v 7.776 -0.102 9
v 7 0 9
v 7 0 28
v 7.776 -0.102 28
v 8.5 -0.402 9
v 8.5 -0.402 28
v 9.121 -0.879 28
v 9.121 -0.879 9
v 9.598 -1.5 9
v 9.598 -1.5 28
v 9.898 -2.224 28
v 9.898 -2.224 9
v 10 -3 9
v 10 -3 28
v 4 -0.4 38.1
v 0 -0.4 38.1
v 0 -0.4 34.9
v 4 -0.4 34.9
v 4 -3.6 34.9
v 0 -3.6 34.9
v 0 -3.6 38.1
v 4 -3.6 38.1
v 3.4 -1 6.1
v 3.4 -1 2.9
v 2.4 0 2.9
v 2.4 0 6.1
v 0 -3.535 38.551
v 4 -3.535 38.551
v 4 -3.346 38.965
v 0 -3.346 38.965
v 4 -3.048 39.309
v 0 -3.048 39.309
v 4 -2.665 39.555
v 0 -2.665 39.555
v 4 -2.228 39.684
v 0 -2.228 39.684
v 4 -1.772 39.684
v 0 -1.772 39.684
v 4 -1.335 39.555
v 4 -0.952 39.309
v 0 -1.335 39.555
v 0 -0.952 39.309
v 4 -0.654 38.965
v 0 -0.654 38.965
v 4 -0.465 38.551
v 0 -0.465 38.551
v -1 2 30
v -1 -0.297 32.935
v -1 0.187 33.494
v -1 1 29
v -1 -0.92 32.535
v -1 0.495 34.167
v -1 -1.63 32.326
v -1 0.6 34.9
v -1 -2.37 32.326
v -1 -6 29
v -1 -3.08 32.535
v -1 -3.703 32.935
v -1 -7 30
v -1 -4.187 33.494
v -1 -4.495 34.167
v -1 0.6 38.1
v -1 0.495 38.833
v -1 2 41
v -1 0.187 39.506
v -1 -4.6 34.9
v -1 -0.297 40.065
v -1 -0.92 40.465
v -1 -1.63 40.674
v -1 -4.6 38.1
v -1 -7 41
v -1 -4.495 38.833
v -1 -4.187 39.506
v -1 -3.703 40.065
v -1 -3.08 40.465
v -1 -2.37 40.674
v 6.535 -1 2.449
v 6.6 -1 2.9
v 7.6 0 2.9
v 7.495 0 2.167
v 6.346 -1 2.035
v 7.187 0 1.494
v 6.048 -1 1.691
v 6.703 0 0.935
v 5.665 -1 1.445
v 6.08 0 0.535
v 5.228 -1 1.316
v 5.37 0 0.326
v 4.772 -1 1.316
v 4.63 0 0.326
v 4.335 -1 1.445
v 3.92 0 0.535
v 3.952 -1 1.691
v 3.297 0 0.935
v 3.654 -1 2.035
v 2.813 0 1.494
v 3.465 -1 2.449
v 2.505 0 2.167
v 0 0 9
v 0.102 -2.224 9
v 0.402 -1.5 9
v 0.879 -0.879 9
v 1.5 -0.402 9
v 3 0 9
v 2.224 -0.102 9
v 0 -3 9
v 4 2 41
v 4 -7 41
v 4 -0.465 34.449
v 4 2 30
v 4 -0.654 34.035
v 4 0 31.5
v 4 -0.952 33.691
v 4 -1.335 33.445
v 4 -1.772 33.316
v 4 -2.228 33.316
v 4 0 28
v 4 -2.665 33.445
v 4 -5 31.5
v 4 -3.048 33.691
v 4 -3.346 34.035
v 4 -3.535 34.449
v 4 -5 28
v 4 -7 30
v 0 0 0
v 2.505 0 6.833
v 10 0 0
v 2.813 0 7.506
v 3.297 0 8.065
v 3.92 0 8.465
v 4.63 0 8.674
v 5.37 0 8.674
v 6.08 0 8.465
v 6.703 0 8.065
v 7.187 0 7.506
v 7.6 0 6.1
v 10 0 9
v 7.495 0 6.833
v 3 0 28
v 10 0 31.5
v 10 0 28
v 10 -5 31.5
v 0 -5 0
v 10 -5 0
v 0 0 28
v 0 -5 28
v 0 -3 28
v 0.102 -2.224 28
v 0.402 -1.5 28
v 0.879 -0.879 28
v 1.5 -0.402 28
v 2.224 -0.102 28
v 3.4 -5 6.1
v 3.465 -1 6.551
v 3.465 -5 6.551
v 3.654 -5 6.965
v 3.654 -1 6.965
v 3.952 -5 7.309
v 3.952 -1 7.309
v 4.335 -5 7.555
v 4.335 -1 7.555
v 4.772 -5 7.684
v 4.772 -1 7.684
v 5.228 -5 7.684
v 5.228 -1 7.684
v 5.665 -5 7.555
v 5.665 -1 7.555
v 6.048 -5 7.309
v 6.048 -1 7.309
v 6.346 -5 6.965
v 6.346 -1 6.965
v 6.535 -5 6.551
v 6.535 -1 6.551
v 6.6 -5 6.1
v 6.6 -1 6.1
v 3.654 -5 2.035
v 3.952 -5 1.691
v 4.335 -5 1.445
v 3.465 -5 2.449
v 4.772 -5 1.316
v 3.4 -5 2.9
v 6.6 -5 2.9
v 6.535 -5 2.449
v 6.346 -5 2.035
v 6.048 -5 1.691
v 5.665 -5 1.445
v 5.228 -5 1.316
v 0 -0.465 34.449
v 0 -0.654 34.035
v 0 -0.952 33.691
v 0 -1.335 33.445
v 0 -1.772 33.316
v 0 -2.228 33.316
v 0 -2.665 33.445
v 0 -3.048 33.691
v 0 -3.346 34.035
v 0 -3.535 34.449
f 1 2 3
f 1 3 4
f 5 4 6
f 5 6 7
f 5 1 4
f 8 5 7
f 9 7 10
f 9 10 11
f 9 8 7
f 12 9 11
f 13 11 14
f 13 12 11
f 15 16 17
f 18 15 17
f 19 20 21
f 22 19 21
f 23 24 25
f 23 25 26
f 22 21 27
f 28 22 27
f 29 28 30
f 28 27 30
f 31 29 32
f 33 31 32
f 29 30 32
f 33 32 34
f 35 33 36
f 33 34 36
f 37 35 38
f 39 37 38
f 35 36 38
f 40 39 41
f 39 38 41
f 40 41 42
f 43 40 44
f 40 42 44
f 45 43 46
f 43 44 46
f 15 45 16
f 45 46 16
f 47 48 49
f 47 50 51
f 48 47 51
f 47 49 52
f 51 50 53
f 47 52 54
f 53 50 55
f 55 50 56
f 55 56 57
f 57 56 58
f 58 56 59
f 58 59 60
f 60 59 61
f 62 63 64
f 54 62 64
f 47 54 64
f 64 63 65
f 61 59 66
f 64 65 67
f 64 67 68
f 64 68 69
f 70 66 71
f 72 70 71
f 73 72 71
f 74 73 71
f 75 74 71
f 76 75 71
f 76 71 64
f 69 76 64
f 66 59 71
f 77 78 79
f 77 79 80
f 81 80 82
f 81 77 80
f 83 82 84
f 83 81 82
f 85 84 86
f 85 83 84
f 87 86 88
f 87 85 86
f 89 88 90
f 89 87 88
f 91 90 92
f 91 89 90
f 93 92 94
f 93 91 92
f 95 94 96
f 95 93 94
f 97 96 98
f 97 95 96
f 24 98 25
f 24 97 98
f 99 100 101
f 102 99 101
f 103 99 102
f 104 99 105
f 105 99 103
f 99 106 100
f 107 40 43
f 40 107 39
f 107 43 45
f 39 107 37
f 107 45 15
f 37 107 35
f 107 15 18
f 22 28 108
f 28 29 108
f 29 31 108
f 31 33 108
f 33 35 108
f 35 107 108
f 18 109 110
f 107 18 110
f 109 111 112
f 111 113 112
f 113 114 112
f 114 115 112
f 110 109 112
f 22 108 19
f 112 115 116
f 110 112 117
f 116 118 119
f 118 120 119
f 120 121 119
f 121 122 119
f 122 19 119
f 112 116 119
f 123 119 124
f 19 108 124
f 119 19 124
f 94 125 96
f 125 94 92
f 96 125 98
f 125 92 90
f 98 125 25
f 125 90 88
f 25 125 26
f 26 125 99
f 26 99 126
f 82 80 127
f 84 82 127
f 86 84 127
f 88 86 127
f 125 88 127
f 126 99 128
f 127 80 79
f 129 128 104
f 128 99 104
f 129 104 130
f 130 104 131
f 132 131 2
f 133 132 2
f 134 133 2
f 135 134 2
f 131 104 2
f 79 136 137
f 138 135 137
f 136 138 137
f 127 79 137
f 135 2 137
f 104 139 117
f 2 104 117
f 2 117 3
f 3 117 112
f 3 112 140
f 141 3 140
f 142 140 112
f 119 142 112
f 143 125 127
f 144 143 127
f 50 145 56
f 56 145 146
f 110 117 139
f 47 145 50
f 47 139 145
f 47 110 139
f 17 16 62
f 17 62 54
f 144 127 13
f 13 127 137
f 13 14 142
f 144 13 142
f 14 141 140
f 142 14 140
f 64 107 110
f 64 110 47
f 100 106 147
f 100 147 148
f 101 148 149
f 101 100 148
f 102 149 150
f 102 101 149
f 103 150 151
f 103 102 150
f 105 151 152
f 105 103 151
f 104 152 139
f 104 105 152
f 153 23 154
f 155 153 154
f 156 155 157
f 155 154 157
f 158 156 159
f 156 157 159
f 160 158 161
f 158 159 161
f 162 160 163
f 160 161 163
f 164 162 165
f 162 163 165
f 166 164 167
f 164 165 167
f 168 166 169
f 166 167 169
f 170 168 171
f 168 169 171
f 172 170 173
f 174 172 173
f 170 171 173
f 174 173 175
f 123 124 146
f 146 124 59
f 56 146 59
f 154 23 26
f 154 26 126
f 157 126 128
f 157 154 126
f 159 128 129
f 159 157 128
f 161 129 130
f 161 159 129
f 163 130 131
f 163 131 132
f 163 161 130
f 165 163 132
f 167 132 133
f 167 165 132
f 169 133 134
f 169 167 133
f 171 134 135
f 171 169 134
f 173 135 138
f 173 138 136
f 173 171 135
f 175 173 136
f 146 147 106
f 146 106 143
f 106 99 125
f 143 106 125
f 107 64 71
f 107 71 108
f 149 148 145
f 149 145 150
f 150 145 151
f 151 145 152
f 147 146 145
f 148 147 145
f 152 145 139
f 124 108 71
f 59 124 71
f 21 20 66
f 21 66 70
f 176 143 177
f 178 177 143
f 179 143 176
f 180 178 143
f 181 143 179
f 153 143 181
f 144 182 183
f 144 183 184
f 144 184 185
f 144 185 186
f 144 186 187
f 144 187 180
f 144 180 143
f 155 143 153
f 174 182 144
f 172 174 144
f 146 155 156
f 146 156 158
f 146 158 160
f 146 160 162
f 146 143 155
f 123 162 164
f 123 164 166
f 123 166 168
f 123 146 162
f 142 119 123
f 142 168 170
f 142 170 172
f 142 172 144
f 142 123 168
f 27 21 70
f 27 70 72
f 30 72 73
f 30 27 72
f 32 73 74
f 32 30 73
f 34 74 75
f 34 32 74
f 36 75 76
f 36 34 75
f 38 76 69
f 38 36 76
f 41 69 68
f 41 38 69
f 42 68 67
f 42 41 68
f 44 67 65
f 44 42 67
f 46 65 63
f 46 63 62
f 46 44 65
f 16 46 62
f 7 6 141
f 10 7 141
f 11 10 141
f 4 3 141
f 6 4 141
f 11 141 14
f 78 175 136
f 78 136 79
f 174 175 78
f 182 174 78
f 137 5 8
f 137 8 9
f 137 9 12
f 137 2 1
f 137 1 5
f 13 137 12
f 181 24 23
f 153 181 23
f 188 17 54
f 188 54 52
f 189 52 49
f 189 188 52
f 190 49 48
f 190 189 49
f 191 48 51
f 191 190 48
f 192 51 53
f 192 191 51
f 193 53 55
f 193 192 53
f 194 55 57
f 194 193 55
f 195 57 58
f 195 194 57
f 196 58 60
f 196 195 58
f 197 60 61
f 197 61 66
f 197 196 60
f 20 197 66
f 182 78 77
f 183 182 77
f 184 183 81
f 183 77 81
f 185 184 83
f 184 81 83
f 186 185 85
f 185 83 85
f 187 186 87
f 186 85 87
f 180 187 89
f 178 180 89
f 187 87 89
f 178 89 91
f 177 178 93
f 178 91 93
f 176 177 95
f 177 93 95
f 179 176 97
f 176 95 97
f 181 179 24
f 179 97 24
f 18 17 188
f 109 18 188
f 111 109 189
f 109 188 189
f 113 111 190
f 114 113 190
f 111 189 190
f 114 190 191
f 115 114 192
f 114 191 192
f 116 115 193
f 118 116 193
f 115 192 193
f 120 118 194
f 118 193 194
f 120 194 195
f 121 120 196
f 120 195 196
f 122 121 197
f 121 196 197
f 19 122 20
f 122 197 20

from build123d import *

# Parameters (mm, degrees)
F1_DEPTH      = 5
F4_DEPTH      = 2
F4_DEPTH_BACK = 7
F6_DEPTH      = 25
F7_SIZE       = 2
F8_SIZE       = 0.99999
F10_DEPTH     = 19
F11_SIZE      = 1


# Not quite as in the source:
# - a fillet or chamfer is up to 0.001 mm smaller than in the source, because OpenCascade refuses the exact size


with BuildPart() as f1:
    # F0 (on Front) → F1 (new body)
    with BuildSketch(Plane.XZ):
        Polygon((0, 28), (0, 0), (10, 0), (10, 31.5), (4, 31.5), (4, 41), (-1, 41), (-1, 28), align=None)
        with BuildLine():
            ThreePointArc((3.4, 6.1), (5, 7.7), (6.6, 6.1))
            Line((6.6, 6.1), (6.6, 2.9))
            ThreePointArc((6.6, 2.9), (5, 1.3), (3.4, 2.9))
            Line((3.4, 2.9), (3.4, 6.1))
        make_face(mode=Mode.SUBTRACT)
    extrude(amount=F1_DEPTH)

    # F3 (on face) → F4 (join, two sides)
    with BuildSketch(Plane(origin=(0, 0, 0), x_dir=(-1, 0, 0), z_dir=(0, 1, 0))) as f4_sk:
        Polygon((1, 28), (1, 41), (-4, 41), (-4, 31.5), (-4, 28), (0, 28), align=None)
    extrude(amount=F4_DEPTH)
    extrude(f4_sk.sketch, amount=-F4_DEPTH_BACK)

    # F5 (on face) → F6 (cut)
    with BuildSketch(Plane(origin=(-1, 0, 0), x_dir=(0, -1, 0), z_dir=(-1, 0, 0))):
        with BuildLine():
            Line((3.6, 34.9), (3.6, 38.1))
            ThreePointArc((3.6, 38.1), (2, 39.7), (0.4, 38.1))
            Line((0.4, 38.1), (0.4, 34.9))
            ThreePointArc((0.4, 34.9), (2, 33.3), (3.6, 34.9))
        make_face()
    extrude(amount=-F6_DEPTH, mode=Mode.SUBTRACT)

    # F7
    f7_edges = [f1.edges().sort_by_distance(p)[0] for p in [
        (1.5, 2, 28),
        (1.5, -7, 28),
    ]]
    chamfer(f7_edges, length=F7_SIZE)

    # F8 (size 1 in the source; OpenCascade refuses exactly that, so slightly less here)
    f8_edges = [f1.edges().sort_by_distance(p)[0] for p in [
        (-1, -2.5, 28),
    ]]
    chamfer(f8_edges, length=F8_SIZE)

    # F9 (on offset) → F10 (cut)
    with BuildSketch(Plane.XY.offset(9)):
        with BuildLine():
            Line((10, 0), (7, 0))
            ThreePointArc((7, 0), (9.1213203436, -0.8786796564), (10, -3))
            Line((10, -3), (10, 0))
        make_face()
        with BuildLine():
            ThreePointArc((0, -3), (0.8786796564, -0.8786796564), (3, 0))
            Line((3, 0), (0, 0))
            Line((0, 0), (0, -3))
        make_face()
    extrude(amount=F10_DEPTH, mode=Mode.SUBTRACT)

    # F11
    f11_edges = [f1.edges().sort_by_distance(p)[0] for p in [
        (6.6, 0, 4.5),
        (-1, -3.6, 36.5),
    ]]
    chamfer(f11_edges, length=F11_SIZE)


solid = f1.part
